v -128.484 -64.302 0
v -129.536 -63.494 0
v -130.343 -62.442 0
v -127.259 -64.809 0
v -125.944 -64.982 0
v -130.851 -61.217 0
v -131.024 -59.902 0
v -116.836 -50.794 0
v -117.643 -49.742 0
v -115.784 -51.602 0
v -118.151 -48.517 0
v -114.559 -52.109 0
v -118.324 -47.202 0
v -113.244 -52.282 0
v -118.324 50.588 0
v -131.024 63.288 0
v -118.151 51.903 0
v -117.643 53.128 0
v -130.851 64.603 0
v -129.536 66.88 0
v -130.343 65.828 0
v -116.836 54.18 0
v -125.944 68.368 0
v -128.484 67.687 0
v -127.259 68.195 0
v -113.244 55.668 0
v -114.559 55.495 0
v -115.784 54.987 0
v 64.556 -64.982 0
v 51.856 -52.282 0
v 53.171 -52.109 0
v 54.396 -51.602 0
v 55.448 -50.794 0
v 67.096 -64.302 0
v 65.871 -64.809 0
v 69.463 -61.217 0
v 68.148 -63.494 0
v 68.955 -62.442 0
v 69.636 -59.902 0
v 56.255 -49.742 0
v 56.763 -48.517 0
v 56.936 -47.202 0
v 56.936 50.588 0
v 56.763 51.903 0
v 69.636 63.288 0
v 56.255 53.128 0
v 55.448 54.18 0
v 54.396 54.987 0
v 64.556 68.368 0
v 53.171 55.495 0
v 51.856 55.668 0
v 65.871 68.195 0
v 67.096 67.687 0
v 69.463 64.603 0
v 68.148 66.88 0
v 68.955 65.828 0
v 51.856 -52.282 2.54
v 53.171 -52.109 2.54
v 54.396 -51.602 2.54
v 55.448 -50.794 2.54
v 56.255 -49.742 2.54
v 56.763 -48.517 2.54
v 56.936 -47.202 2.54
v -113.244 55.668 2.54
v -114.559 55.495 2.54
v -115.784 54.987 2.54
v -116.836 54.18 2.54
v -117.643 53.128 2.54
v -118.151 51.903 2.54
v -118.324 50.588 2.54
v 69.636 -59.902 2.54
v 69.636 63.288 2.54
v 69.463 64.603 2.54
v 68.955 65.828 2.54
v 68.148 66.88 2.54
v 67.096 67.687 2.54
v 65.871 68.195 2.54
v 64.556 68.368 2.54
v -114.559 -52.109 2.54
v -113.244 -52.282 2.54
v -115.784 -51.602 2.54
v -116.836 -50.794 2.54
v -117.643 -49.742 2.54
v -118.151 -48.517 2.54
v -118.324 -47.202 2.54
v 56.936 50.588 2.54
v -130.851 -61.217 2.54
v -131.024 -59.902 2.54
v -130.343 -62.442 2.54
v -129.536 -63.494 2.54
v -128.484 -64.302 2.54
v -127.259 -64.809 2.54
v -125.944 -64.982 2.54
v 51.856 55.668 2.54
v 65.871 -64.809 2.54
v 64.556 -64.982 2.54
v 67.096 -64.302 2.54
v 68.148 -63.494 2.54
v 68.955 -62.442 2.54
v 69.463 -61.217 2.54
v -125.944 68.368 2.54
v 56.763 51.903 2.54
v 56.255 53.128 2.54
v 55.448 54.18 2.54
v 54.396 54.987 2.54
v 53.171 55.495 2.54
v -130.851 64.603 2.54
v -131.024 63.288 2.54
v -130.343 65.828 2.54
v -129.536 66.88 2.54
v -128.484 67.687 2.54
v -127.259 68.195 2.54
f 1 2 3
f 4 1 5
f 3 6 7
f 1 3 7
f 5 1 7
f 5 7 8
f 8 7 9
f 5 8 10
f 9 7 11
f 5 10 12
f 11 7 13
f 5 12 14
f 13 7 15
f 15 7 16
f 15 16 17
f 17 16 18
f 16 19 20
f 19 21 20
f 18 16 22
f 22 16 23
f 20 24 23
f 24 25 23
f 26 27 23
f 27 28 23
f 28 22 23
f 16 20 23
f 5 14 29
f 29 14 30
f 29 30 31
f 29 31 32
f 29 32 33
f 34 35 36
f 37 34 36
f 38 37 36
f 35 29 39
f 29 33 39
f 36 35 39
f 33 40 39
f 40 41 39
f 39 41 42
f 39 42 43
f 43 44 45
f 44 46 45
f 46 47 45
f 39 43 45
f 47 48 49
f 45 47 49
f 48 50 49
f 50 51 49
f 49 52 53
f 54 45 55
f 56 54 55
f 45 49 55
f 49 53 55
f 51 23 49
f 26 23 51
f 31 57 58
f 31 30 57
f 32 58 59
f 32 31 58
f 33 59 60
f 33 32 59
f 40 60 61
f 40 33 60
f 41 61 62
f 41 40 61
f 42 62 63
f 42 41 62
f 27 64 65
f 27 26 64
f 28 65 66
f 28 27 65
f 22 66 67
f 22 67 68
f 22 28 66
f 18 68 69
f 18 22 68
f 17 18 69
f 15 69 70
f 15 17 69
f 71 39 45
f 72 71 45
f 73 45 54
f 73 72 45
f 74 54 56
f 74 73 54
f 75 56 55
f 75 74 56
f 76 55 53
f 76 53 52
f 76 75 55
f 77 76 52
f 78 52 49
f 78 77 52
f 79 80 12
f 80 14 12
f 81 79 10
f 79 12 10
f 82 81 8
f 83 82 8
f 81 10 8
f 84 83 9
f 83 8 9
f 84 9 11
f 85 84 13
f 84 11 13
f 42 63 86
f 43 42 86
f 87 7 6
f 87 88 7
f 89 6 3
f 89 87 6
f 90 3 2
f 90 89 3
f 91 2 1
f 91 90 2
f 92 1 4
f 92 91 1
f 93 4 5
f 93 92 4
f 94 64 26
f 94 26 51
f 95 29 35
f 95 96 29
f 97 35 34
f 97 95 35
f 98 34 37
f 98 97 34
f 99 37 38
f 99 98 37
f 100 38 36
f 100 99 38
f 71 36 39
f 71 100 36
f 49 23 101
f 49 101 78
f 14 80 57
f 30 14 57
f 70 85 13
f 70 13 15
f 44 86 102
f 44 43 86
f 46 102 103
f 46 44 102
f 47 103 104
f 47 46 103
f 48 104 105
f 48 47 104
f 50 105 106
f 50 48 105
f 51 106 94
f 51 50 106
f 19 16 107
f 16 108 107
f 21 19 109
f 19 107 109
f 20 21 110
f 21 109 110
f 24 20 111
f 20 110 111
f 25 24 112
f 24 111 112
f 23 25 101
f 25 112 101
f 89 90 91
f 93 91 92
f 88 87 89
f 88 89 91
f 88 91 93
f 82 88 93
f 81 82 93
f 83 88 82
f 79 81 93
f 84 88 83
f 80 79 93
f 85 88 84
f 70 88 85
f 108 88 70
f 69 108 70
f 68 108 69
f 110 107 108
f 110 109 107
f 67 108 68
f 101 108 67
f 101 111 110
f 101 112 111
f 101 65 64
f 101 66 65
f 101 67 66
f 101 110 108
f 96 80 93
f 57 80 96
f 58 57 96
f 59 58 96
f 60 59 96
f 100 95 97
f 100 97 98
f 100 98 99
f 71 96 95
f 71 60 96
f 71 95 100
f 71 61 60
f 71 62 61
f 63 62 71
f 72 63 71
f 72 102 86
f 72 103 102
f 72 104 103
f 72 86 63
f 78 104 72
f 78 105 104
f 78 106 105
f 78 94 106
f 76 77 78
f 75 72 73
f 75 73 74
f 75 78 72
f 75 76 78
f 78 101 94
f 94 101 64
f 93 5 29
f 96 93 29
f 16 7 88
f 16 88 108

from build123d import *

# Parameters (mm, degrees)
F0_W     = 200.66
F0_H     = 133.35
F1_DEPTH = 2.54
F2_R     = 5.08
F3_W     = 175.26
F3_H     = 107.95
F4_DEPTH = 5.08
F5_R     = 5.08


with BuildPart() as f1:
    # F0 (on Top) → F1 (new body)
    with BuildSketch(Plane.XY):
        with Locations((-30.6939995439, 1.6928559164)):
            Rectangle(F0_W, F0_H)
    extrude(amount=F1_DEPTH)

    # F2
    f2_edges = [f1.edges().sort_by_distance(p)[0] for p in [
        (69.636, -64.982144, 1.27),
        (69.636, 68.367856, 1.27),
        (-131.024, -64.982144, 1.27),
        (-131.024, 68.367856, 1.27),
    ]]
    fillet(f2_edges, radius=F2_R)

    # F3 (on face) → F4 (cut)
    with BuildSketch(Plane.XY.offset(2.54)):
        with Locations((-30.6939995439, 1.6928559164)):
            Rectangle(F3_W, F3_H)
    extrude(amount=-F4_DEPTH, mode=Mode.SUBTRACT)

    # F5
    f5_edges = [f1.edges().sort_by_distance(p)[0] for p in [
        (-118.324, -52.282144, 1.27),
        (56.936, -52.282144, 1.27),
        (56.936, 55.667856, 1.27),
        (-118.324, 55.667856, 1.27),
    ]]
    fillet(f5_edges, radius=F5_R)


solid = f1.part
